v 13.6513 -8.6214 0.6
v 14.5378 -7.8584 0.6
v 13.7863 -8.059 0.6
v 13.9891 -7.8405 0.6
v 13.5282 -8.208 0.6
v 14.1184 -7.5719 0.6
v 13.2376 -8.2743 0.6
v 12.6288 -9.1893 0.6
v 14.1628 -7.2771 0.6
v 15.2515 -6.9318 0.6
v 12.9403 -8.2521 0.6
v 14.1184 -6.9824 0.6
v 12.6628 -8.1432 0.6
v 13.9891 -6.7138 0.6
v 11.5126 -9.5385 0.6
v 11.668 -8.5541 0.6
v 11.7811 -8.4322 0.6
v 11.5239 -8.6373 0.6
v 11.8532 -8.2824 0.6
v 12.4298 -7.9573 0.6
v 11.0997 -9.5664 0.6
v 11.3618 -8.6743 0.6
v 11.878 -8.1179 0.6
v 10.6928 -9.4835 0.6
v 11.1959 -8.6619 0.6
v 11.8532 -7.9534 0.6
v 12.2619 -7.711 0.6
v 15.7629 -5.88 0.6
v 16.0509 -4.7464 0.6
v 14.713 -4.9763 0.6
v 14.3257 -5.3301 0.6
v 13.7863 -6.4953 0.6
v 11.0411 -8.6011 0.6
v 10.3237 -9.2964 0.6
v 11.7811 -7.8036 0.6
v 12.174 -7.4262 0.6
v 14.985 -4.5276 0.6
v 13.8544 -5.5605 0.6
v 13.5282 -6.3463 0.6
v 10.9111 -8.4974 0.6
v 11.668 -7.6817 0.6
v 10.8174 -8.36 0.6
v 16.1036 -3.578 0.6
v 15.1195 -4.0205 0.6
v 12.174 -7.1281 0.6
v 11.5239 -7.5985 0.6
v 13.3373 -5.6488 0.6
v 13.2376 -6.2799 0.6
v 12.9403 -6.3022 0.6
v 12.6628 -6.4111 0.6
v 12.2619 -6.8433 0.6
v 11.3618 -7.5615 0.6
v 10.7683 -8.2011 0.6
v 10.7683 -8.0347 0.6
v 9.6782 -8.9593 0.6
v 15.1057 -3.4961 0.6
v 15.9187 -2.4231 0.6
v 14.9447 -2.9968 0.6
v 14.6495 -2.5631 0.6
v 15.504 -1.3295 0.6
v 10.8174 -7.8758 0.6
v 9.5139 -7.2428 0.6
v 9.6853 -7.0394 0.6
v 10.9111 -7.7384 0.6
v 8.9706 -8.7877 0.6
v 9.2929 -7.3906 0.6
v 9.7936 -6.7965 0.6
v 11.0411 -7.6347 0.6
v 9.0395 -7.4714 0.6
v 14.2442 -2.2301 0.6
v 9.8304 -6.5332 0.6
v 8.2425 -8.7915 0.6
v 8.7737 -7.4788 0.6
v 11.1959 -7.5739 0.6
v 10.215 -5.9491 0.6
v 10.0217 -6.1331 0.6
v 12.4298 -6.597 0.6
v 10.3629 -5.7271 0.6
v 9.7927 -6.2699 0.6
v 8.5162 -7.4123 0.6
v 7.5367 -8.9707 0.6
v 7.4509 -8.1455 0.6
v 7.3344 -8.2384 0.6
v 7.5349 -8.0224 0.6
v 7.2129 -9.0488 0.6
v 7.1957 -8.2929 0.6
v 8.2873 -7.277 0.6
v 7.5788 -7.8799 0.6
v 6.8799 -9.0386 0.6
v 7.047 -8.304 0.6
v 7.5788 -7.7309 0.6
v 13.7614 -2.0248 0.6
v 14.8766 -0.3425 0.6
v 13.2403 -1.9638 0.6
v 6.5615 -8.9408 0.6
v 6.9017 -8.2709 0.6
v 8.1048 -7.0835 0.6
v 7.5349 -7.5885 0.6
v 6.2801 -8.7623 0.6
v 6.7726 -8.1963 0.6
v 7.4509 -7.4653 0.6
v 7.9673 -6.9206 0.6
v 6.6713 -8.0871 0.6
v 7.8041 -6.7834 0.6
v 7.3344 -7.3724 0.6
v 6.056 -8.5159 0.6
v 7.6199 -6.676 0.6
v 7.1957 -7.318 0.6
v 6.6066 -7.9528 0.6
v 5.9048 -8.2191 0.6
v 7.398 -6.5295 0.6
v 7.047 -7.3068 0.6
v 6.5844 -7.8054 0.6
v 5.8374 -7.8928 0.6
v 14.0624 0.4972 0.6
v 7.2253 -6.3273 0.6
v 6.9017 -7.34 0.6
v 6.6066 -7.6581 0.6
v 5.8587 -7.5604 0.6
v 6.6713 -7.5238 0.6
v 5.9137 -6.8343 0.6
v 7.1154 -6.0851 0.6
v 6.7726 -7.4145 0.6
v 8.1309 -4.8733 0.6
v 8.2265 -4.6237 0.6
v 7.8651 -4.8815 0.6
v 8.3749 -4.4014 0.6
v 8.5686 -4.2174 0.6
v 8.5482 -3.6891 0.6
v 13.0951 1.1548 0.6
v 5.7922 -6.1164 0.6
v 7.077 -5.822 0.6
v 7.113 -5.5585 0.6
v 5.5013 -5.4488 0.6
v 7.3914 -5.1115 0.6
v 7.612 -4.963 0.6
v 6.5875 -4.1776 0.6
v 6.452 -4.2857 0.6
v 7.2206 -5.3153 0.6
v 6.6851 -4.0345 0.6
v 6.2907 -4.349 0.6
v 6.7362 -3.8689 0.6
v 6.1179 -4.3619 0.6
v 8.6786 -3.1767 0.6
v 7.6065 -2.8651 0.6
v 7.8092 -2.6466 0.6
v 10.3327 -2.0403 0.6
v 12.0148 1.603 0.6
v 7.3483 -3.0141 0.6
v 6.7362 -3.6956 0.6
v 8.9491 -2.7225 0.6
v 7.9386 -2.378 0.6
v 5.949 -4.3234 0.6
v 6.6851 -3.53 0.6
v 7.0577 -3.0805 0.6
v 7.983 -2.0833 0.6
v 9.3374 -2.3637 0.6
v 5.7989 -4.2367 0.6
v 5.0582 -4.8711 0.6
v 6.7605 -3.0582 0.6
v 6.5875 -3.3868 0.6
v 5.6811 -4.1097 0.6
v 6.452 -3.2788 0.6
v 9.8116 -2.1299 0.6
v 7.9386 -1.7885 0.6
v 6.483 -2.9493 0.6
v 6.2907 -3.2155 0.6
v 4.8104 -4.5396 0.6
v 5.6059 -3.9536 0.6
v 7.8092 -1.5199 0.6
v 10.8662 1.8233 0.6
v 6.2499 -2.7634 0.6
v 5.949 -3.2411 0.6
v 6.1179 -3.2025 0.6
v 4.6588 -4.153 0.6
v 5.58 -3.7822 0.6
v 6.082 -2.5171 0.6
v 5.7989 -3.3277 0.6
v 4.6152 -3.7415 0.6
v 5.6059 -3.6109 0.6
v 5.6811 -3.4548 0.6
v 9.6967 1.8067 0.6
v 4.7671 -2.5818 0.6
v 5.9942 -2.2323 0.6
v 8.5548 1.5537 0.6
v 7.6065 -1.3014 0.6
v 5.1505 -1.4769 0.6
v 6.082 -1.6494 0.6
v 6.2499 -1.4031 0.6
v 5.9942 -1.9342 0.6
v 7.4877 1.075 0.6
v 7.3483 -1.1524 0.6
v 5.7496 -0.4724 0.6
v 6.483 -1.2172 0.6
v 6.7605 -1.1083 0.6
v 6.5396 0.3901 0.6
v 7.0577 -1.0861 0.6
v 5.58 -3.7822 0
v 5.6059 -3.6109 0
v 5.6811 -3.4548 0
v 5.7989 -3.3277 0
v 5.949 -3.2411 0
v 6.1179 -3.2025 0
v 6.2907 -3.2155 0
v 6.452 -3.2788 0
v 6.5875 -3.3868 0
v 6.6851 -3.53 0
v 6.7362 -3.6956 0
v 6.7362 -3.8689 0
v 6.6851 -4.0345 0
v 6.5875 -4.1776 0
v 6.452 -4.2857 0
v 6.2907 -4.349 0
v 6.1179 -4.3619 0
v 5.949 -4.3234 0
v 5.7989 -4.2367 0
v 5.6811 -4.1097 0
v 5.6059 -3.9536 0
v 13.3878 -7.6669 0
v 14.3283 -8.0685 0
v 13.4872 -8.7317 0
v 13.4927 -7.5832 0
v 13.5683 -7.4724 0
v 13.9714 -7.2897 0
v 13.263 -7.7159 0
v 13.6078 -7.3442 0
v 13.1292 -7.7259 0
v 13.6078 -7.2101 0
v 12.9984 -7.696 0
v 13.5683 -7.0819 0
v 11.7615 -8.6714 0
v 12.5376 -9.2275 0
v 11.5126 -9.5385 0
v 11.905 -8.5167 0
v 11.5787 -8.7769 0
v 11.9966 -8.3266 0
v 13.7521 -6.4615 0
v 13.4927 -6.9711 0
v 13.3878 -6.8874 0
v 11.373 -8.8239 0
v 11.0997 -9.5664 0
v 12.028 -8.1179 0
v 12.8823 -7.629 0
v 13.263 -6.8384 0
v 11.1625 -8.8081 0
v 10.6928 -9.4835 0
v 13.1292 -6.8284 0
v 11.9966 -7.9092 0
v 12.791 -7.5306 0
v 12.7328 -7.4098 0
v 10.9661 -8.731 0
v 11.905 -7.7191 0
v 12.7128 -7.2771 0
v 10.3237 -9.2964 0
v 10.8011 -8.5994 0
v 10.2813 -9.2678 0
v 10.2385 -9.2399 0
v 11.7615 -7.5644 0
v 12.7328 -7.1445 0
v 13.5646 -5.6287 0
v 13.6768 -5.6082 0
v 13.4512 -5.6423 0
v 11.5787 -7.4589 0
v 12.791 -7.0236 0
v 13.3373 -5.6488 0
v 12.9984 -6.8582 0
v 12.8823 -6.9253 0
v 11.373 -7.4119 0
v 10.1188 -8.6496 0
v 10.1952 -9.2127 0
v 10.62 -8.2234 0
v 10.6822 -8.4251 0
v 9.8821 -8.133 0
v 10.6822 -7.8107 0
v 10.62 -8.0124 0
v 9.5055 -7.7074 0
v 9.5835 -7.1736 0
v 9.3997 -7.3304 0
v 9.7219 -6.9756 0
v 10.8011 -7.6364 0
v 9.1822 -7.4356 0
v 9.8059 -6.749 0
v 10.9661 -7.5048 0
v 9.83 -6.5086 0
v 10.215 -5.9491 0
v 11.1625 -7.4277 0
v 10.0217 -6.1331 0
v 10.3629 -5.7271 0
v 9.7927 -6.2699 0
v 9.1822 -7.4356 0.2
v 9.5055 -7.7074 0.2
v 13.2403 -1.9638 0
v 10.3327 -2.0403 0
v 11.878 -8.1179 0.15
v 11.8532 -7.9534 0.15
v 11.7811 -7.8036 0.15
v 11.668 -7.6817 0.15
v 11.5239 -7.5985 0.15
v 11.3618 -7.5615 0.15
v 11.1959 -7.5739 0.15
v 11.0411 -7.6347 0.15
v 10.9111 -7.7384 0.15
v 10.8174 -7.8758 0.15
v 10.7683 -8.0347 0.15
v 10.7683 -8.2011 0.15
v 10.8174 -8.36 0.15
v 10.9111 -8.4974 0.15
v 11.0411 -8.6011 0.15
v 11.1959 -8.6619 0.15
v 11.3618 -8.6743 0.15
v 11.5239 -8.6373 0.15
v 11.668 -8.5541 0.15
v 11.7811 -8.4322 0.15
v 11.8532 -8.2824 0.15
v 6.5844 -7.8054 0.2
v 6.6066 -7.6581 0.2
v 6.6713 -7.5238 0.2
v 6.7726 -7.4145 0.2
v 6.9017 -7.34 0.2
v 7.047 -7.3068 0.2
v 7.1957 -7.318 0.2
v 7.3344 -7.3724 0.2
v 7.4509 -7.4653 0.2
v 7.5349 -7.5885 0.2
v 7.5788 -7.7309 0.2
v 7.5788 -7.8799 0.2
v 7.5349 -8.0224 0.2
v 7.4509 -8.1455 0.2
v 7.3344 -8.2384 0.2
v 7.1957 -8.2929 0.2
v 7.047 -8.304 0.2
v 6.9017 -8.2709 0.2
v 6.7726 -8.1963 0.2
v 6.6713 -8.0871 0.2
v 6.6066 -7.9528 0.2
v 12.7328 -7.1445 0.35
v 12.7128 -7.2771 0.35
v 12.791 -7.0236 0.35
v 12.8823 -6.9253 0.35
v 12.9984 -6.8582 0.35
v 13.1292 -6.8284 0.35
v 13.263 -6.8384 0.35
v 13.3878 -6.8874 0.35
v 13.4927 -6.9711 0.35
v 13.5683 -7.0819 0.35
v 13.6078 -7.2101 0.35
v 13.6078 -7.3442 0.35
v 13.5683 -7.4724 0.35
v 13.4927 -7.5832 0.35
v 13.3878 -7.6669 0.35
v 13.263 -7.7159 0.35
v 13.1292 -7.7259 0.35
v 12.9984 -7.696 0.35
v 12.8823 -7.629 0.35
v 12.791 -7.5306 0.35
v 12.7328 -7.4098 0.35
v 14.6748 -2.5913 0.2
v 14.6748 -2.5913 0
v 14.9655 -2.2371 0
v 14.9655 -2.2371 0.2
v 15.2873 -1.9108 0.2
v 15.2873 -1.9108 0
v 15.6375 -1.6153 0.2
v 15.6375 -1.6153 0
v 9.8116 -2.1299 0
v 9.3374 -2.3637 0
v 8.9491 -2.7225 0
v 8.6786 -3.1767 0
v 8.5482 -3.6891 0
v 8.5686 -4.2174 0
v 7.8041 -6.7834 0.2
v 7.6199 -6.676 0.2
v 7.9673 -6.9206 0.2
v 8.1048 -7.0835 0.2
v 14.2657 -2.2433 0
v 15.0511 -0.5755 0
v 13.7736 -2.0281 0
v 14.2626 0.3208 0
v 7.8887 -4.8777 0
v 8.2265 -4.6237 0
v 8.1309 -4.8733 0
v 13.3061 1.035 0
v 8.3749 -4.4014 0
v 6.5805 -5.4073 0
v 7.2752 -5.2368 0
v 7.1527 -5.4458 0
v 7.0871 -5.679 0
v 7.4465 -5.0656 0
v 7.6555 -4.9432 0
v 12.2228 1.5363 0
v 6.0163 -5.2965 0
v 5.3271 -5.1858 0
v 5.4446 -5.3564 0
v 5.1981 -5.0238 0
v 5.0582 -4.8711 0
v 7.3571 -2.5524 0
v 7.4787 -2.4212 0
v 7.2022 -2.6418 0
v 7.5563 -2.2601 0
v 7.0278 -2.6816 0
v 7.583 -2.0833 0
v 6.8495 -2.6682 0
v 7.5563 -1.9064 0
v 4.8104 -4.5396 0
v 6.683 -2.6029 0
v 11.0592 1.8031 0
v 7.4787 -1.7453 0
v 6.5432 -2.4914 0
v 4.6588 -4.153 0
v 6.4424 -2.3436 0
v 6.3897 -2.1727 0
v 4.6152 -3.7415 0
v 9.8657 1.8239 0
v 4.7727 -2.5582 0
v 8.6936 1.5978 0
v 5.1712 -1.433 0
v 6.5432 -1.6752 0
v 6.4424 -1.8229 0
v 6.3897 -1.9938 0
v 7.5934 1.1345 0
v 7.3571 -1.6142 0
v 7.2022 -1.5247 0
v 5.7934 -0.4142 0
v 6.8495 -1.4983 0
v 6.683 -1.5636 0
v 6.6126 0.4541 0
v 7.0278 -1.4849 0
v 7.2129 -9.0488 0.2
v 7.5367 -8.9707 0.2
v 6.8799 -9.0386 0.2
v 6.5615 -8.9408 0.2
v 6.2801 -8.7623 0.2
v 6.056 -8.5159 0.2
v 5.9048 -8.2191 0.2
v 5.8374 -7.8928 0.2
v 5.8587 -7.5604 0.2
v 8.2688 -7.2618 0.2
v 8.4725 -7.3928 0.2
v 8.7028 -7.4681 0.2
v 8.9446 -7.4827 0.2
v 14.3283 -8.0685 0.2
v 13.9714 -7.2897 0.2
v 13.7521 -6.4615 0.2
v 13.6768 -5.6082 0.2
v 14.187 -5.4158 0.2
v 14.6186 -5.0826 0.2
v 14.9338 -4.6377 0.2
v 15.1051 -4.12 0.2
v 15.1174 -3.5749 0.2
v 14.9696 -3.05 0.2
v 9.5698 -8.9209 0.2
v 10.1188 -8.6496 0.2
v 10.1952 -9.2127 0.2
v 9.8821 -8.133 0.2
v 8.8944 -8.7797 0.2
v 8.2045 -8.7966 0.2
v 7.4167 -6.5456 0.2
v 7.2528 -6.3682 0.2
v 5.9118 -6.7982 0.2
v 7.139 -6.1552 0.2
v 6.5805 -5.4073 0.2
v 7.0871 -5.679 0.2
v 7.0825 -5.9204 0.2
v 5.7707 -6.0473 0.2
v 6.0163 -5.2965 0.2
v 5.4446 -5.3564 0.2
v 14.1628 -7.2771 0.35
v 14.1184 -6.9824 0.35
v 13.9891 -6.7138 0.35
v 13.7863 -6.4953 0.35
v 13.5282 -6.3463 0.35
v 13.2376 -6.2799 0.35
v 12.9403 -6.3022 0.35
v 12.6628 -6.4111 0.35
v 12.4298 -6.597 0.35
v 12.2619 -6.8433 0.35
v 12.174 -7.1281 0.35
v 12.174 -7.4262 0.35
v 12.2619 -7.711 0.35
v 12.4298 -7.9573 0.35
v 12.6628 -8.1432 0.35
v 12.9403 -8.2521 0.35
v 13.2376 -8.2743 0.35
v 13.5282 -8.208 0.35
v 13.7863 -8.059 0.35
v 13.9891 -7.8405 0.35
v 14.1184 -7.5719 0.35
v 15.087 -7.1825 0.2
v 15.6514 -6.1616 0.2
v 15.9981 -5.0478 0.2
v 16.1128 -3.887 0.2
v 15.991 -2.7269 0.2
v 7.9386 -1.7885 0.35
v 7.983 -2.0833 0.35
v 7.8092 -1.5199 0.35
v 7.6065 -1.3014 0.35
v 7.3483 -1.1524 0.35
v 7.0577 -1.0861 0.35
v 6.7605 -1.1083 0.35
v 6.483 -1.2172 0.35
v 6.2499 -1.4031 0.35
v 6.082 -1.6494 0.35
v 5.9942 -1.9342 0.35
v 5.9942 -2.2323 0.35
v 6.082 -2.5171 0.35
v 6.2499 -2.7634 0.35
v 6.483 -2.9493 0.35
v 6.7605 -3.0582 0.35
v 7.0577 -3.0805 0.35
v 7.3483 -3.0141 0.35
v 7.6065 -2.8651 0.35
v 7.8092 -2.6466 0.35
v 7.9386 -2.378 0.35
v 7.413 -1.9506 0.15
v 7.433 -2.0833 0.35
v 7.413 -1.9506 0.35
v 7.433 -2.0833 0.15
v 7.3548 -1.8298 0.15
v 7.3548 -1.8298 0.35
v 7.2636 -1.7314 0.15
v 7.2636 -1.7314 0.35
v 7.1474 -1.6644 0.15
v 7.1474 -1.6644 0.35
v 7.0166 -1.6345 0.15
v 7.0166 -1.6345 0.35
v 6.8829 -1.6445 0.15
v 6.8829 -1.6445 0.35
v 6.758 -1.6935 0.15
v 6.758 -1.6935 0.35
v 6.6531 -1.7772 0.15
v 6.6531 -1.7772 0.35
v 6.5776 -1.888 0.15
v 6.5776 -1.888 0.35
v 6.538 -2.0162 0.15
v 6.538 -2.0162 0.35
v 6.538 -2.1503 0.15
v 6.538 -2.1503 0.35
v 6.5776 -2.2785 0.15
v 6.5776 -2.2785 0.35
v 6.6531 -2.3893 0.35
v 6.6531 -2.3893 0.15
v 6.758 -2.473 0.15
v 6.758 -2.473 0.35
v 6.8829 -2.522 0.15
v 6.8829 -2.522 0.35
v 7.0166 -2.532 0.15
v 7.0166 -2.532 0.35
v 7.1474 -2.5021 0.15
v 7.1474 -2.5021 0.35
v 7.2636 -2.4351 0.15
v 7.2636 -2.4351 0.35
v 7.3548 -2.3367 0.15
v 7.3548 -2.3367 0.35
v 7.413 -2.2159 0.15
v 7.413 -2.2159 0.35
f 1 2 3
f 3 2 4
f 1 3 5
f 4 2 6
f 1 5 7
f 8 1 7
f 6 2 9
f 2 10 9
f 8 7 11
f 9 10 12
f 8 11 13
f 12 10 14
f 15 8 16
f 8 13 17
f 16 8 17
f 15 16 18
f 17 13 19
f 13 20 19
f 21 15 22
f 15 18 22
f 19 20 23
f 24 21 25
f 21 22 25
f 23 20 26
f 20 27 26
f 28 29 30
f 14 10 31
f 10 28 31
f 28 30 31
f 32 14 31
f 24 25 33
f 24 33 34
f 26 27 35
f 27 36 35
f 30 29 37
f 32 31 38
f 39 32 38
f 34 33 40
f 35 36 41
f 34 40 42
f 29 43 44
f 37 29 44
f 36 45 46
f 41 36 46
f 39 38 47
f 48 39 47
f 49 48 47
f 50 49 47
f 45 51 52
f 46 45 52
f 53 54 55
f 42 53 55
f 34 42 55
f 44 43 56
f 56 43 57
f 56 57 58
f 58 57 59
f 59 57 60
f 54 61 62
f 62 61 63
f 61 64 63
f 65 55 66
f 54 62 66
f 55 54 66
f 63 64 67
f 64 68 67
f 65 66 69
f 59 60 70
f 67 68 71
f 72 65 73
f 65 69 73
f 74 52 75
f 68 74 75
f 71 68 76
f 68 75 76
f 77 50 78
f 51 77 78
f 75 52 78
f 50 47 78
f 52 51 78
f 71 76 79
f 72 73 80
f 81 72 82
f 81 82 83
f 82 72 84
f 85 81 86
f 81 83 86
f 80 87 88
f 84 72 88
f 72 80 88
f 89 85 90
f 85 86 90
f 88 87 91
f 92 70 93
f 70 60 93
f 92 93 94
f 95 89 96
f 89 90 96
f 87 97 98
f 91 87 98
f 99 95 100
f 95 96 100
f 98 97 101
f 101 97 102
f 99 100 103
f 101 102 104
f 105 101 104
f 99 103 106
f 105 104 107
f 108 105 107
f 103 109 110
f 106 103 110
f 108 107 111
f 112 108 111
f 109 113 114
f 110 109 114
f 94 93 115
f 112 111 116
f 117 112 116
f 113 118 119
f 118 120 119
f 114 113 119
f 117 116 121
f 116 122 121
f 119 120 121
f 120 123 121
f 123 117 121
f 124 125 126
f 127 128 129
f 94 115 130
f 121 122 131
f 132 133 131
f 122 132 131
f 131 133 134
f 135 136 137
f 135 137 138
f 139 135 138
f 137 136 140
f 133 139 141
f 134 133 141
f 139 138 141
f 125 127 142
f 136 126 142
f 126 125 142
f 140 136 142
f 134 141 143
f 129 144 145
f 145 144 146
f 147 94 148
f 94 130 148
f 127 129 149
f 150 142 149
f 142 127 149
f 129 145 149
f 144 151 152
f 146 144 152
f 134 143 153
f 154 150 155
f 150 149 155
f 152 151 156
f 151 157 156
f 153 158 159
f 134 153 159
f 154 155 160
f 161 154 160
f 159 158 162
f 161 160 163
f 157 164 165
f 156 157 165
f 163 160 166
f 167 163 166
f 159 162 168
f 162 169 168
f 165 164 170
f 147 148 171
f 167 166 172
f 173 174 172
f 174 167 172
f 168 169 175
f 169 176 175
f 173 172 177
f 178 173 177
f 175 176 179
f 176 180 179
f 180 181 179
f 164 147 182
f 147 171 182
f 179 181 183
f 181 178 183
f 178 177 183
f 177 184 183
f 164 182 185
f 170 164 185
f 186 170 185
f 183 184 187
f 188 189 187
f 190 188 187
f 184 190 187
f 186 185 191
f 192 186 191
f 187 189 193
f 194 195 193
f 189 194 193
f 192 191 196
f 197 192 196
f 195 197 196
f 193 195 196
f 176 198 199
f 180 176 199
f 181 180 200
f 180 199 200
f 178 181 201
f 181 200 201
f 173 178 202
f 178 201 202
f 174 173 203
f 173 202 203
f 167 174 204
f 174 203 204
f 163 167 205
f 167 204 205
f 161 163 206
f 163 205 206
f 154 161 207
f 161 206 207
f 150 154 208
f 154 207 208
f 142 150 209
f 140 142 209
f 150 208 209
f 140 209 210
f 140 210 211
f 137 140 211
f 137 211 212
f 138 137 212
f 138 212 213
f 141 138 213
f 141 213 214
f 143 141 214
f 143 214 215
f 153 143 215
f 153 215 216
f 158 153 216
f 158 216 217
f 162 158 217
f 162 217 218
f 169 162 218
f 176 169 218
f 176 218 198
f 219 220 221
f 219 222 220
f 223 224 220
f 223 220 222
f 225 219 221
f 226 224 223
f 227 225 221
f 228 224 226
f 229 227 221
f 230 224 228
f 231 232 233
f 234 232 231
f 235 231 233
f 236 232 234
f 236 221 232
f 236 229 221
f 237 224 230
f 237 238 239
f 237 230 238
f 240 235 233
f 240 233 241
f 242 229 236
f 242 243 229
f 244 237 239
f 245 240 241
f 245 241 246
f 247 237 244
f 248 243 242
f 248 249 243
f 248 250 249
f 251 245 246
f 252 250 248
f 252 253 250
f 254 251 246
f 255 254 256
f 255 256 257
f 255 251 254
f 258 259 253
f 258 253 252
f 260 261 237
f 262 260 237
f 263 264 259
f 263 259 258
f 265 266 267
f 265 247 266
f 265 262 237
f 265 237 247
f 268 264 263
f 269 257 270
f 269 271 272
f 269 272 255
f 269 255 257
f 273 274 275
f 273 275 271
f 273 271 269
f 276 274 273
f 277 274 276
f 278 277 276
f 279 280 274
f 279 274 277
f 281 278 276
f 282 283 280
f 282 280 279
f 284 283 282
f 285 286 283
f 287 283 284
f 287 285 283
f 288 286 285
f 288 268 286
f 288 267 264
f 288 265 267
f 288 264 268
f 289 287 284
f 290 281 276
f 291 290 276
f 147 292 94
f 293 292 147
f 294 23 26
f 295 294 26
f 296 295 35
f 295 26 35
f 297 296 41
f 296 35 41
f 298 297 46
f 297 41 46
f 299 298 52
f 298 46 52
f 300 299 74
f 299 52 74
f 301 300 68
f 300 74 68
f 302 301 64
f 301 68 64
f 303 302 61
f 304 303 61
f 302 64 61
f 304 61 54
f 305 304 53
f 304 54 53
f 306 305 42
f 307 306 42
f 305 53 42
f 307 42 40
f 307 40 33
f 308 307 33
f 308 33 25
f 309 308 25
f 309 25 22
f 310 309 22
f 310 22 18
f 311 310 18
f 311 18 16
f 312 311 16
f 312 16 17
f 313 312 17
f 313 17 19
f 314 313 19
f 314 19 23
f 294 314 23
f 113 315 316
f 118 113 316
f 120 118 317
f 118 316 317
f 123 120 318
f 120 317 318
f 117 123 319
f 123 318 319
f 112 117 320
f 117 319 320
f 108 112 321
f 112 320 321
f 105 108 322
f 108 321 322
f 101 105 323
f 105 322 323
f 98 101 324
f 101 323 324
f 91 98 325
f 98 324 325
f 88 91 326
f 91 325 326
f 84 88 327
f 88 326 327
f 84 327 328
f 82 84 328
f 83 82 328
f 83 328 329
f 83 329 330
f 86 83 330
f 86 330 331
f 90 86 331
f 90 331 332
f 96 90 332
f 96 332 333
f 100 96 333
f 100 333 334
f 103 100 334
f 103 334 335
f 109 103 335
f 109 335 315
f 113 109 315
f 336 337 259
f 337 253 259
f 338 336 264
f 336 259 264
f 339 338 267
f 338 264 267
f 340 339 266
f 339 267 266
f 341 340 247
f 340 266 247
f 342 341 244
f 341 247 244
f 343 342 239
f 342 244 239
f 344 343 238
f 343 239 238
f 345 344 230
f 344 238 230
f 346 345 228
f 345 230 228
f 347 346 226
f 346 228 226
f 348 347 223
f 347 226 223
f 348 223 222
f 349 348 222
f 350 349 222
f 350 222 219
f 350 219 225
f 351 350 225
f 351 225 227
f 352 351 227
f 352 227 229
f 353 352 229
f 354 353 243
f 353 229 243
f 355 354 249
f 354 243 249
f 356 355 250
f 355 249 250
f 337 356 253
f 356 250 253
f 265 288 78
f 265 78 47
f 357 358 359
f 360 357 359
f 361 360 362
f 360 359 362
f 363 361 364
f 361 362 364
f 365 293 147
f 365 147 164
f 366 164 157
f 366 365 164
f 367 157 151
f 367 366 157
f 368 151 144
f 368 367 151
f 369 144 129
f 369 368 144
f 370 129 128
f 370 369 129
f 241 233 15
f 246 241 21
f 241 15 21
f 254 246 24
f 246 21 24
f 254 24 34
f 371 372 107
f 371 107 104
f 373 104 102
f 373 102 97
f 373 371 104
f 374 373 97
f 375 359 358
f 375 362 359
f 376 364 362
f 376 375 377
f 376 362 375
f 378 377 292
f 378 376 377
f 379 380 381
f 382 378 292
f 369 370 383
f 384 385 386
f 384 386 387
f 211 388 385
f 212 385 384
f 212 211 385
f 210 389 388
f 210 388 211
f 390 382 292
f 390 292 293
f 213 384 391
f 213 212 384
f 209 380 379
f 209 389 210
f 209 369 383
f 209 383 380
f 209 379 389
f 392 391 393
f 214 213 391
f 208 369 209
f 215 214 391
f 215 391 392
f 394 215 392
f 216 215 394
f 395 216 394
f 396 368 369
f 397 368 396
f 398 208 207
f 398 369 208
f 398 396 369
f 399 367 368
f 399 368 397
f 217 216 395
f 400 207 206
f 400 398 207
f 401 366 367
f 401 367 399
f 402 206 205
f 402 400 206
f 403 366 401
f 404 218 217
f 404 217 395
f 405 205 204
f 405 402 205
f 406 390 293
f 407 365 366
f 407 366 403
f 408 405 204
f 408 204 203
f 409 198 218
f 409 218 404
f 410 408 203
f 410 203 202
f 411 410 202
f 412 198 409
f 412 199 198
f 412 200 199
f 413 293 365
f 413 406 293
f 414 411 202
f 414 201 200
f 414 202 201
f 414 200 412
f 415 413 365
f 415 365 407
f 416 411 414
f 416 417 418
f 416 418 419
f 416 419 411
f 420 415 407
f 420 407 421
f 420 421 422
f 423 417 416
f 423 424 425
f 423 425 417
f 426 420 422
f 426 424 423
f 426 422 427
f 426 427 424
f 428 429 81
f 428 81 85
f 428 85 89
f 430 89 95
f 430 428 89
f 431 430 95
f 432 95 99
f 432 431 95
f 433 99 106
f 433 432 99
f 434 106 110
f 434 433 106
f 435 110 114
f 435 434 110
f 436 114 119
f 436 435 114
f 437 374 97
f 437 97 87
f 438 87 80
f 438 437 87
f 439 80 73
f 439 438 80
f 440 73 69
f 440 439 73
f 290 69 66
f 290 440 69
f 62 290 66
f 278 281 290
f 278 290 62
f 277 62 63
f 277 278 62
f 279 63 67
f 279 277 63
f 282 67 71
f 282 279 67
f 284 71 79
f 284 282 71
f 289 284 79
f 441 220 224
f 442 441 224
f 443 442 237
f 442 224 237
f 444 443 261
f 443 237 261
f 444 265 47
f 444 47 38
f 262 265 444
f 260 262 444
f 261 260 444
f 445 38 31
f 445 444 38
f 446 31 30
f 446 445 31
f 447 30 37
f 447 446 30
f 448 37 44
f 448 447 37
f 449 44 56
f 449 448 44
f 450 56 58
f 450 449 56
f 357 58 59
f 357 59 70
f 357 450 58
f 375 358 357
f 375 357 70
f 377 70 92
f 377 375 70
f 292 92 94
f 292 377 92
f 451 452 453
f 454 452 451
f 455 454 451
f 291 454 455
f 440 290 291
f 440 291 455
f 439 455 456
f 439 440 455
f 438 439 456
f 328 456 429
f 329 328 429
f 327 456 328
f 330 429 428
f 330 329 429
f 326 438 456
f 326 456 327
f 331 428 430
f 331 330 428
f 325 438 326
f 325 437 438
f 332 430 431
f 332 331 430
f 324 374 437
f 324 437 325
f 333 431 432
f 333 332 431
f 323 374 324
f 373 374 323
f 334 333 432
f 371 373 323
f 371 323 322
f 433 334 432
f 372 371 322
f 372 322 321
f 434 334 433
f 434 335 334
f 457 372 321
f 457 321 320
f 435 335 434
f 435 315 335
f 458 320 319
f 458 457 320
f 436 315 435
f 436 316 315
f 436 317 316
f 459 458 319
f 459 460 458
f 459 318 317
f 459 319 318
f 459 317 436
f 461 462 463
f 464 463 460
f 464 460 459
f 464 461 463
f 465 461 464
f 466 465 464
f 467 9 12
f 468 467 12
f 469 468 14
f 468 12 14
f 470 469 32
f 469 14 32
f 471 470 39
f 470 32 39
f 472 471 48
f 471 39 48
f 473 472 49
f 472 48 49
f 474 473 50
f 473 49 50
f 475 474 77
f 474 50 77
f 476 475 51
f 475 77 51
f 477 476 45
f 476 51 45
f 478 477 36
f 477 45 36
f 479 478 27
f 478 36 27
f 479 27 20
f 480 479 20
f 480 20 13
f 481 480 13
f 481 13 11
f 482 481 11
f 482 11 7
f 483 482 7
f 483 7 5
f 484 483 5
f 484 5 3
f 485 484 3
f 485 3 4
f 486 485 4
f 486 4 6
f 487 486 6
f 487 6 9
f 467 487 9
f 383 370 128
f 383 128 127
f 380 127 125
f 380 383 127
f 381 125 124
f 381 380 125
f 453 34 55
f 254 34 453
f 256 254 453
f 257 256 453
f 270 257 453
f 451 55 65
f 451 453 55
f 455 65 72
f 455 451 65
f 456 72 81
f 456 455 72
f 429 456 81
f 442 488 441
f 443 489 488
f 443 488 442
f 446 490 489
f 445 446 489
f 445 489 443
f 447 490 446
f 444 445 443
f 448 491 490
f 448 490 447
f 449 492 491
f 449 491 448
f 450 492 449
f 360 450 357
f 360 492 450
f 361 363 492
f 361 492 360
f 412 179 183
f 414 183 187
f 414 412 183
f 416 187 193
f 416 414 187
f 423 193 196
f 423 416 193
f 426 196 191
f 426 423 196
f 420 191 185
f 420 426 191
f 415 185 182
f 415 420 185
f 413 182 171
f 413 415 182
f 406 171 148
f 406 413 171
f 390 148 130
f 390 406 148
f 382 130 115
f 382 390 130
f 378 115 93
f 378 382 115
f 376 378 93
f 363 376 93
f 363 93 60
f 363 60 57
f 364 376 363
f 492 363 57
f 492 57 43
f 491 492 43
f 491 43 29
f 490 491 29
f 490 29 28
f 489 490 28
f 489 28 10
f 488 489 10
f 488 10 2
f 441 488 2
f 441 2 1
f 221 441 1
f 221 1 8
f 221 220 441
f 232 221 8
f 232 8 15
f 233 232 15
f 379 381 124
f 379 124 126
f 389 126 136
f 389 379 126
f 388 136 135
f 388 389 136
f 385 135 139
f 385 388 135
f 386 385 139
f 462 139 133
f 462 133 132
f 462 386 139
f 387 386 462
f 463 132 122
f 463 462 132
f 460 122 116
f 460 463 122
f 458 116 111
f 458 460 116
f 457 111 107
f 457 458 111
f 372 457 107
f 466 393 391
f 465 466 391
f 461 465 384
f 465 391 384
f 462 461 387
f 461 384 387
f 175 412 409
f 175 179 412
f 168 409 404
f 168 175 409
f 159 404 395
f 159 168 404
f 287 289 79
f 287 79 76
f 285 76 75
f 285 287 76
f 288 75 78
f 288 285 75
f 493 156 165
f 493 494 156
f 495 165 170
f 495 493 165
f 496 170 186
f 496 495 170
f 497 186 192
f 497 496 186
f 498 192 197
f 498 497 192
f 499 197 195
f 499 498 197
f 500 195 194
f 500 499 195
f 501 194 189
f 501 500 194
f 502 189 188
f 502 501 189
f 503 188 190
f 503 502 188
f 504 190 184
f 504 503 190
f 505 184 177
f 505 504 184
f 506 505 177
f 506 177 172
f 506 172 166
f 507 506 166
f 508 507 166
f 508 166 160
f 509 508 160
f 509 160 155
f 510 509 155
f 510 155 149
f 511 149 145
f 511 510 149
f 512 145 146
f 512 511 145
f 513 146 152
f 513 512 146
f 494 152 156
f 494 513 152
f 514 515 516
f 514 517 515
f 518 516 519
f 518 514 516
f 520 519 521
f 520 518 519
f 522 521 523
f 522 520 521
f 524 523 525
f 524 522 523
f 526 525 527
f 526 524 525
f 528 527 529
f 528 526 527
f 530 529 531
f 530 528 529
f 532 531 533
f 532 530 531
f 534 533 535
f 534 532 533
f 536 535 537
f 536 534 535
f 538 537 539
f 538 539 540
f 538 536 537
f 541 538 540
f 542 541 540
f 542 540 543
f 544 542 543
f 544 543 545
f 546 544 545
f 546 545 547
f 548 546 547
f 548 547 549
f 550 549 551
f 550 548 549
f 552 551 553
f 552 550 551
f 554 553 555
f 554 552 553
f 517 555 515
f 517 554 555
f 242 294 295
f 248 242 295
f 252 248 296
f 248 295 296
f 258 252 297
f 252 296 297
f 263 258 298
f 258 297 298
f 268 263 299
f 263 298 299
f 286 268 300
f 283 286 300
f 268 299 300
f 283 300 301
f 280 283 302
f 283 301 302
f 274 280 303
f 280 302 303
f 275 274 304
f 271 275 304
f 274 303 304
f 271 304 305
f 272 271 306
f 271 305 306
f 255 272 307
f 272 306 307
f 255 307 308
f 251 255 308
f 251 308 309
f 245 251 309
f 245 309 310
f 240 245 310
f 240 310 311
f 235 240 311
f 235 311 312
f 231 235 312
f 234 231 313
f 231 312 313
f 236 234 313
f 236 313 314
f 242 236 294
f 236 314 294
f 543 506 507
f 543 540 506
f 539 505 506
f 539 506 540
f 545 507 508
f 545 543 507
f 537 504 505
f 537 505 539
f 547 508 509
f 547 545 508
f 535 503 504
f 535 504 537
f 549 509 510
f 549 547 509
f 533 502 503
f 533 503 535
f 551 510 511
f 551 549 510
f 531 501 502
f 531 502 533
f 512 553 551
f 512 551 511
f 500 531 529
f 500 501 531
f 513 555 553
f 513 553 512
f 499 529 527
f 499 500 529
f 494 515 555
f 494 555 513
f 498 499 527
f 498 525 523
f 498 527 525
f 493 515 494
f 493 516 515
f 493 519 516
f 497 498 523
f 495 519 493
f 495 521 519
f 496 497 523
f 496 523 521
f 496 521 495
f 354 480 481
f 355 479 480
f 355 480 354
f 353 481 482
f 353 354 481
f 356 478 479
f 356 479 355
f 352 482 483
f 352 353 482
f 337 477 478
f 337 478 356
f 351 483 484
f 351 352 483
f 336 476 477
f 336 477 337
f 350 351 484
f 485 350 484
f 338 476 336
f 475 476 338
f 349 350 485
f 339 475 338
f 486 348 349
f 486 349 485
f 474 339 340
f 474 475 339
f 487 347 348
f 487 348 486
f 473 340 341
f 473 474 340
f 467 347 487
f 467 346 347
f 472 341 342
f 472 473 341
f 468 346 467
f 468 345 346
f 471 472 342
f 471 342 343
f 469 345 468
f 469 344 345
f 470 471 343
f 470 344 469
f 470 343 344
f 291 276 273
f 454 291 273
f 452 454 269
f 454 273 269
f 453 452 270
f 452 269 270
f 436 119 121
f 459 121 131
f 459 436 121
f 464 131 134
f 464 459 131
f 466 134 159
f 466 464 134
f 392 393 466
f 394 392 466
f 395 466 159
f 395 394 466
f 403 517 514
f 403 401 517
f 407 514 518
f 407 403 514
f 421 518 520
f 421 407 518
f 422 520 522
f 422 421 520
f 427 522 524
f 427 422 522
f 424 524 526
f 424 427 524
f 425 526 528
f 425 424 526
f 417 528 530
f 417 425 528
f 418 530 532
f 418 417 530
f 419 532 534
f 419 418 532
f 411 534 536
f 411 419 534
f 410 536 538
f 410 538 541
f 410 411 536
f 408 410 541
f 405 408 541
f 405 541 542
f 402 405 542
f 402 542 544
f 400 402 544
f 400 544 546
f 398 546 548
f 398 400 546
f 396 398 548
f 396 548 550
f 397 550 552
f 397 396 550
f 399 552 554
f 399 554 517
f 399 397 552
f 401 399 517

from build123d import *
from OCP.BRepAlgoAPI import BRepAlgoAPI_Cut
from OCP.TopTools import TopTools_ListOfShape

# Parameters (mm, degrees)
BOSS_EXTRUDE1_DEPTH = 0.6
CUT_EXTRUDE1_DEPTH  = 0.2
SKETCH3_R           = 5.02
CUT_EXTRUDE2_DEPTH  = 0.2
HOLE1_D             = 1.162628638
HOLE2_D             = 1.115918006
HOLE3_D             = 1
HOLE3_DEPTH         = 0.6001
HOLE4_D             = 0.9
HOLE4_CBORE_D       = 2
HOLE4_CBORE_DEPTH   = 0.25
CHAMFER1_SIZE       = 0.15
FILLET1_R           = 1.55


with BuildPart() as part:
    # Sketch1 → Boss-Extrude1 (new body)
    with BuildSketch(Plane(origin=(0, 0, 0), x_dir=(-1, 0, 0), z_dir=(0, 0, -1))):
        with BuildLine():
            ThreePointArc((-10.73984142, -9.642233438), (-9.237924029, -8.831220946), (-7.536736276, -8.970710503))
            ThreePointArc((-7.536736276, -8.970710503), (-6.280146099, -8.76234417), (-5.858651118, -7.560355242))
            ThreePointArc((-5.858651118, -7.560355242), (-5.703315536, -5.860541144), (-4.645947853, -4.520589395))
            ThreePointArc((-4.645947853, -4.520589395), (-14.062387044, 0.497211479), (-10.73984142, -9.642233438))
        make_face()
        with BuildLine():
            Line((-10.362858107, -5.727073657), (-13.337303888, -5.648813517))
            ThreePointArc((-13.337303888, -5.648813517), (-15.131326546, -3.757835425), (-13.240348455, -1.963812767))
            Line((-13.240348455, -1.963812767), (-10.332680536, -2.040315926))
            ThreePointArc((-10.332680536, -2.040315926), (-8.949116824, -2.722465033), (-8.568642053, -4.217394763))
            ThreePointArc((-8.568642053, -4.217394763), (-8.294480547, -4.508437442), (-8.130929885, -4.873295708))
            ThreePointArc((-8.130929885, -4.873295708), (-7.112967422, -5.558507477), (-7.619937202, -6.675979798))
            ThreePointArc((-7.619937202, -6.675979798), (-7.888624675, -6.848520839), (-8.104829371, -7.083507857))
            ThreePointArc((-8.104829371, -7.083507857), (-9.292871814, -7.39061288), (-9.792686542, -6.269923994))
            ThreePointArc((-9.792686542, -6.269923994), (-10.123466132, -6.046492366), (-10.362858107, -5.727073657))
        make_face(mode=Mode.SUBTRACT)
    extrude(amount=-BOSS_EXTRUDE1_DEPTH)


with BuildPart() as cut_extrude1_tool:
    # Sketch2 → Cut-Extrude1 (new body)
    with BuildSketch(Plane(origin=(0, 0, 0), x_dir=(-1, 0, 0), z_dir=(0, 0, -1))):
        with BuildLine():
            Line((-9.182196127, -7.435630798), (-9.505531001, -7.707379249))
            ThreePointArc((-9.505531001, -7.707379249), (-10.019572014, -8.382539981), (-10.195186161, -9.212744683))
            ThreePointArc((-10.195186161, -9.212744683), (-8.894364476, -8.779749468), (-7.536736276, -8.97071434))
            ThreePointArc((-7.536736276, -8.97071434), (-6.280146099, -8.762348007), (-5.858651118, -7.560359079))
            ThreePointArc((-5.858651118, -7.560359079), (-5.86528742, -6.418236665), (-5.444571647, -5.356405283))
            ThreePointArc((-5.444571647, -5.356405283), (-6.302543189, -5.330829684), (-7.087113788, -5.678993801))
            ThreePointArc((-7.087113788, -5.678993801), (-7.189102384, -6.265354701), (-7.619937202, -6.675966608))
            ThreePointArc((-7.619937202, -6.675966608), (-7.888634149, -6.84851254), (-8.104845502, -7.083507857))
            ThreePointArc((-8.104845502, -7.083507857), (-8.585255131, -7.43783823), (-9.182196127, -7.435630798))
        make_face()
    extrude(amount=-CUT_EXTRUDE1_DEPTH)


with BuildPart() as part_1:
    add(part.part)

    # Cut-Extrude1: cut by cut_extrude1_tool, with a tolerance
    cut_extrude1_stock = TopTools_ListOfShape()
    cut_extrude1_stock.Append(part_1.part.wrapped)
    cut_extrude1_tools = TopTools_ListOfShape()
    cut_extrude1_tools.Append(cut_extrude1_tool.part.wrapped)
    cut_extrude1_cut = BRepAlgoAPI_Cut()
    cut_extrude1_cut.SetArguments(cut_extrude1_stock)
    cut_extrude1_cut.SetTools(cut_extrude1_tools)
    cut_extrude1_cut.SetFuzzyValue(0.00001)
    cut_extrude1_cut.Build()
    add(Compound.cast(cut_extrude1_cut.Shape()).solids(), mode=Mode.REPLACE)

    # Sketch3 → Cut-Extrude2 (cut)
    with BuildSketch(Plane(origin=(0, 0, 0), x_dir=(-1, 0, 0), z_dir=(0, 0, -1))):
        with Locations((-18.696793444, -5.59532139)):
            Circle(SKETCH3_R)
    extrude(amount=-CUT_EXTRUDE2_DEPTH, mode=Mode.SUBTRACT)

    # Sketch4 → Cut-Revolve1 (revolve, cut)
    with BuildSketch(Plane(origin=(0, -2.083255033, 0), x_dir=(1, 0, 0), z_dir=(0, 1, 0))):
        Polygon((7.58298739, 0), (6.98298739, 0), (6.98298739, -0.6), (7.98298739, -0.6), (7.98298739, -0.35), (7.43298739, -0.35), (7.43298739, -0.15), align=None)
    revolve(axis=Axis((6.98298739, -2.083255033, 0), (0, 0, 1)), mode=Mode.SUBTRACT)

    # Hole1 (through all)
    with Locations(Plane.XY.offset(0.6)):
        with Locations((6.16136425, -3.782231089)):
            Hole(HOLE1_D / 2)

    # Hole2 (through all)
    with Locations(Plane(origin=(0, 0, 0), x_dir=(-1, 0, 0), z_dir=(0, 0, -1))):
        with Locations((-11.320076522, -8.117897225)):
            Hole(HOLE2_D / 2)

    # Hole3
    with Locations(Plane.XY.offset(0.6)):
        with Locations((7.08439152, -7.80542761)):
            Hole(HOLE3_D / 2, depth=HOLE3_DEPTH)

    # Hole4 (through all)
    with Locations(Plane.XY.offset(0.6)):
        with Locations((13.162833859, -7.277138633)):
            CounterBoreHole(HOLE4_D / 2, HOLE4_CBORE_D / 2, HOLE4_CBORE_DEPTH)

    # Chamfer1
    chamfer1_edges = [part_1.edges().sort_by_distance(p)[0] for p in [
        (10.762117519, -8.117897225, 0),
    ]]
    chamfer(chamfer1_edges, length=CHAMFER1_SIZE)

    # Fillet1
    fillet1_edges = [part_1.edges().sort_by_distance(p)[0] for p in [
        (4.645947853, -4.520589395, 0.3),
        (10.73984142, -9.642233438, 0.3),
    ]]
    fillet(fillet1_edges, radius=FILLET1_R)


solid = part_1.part
